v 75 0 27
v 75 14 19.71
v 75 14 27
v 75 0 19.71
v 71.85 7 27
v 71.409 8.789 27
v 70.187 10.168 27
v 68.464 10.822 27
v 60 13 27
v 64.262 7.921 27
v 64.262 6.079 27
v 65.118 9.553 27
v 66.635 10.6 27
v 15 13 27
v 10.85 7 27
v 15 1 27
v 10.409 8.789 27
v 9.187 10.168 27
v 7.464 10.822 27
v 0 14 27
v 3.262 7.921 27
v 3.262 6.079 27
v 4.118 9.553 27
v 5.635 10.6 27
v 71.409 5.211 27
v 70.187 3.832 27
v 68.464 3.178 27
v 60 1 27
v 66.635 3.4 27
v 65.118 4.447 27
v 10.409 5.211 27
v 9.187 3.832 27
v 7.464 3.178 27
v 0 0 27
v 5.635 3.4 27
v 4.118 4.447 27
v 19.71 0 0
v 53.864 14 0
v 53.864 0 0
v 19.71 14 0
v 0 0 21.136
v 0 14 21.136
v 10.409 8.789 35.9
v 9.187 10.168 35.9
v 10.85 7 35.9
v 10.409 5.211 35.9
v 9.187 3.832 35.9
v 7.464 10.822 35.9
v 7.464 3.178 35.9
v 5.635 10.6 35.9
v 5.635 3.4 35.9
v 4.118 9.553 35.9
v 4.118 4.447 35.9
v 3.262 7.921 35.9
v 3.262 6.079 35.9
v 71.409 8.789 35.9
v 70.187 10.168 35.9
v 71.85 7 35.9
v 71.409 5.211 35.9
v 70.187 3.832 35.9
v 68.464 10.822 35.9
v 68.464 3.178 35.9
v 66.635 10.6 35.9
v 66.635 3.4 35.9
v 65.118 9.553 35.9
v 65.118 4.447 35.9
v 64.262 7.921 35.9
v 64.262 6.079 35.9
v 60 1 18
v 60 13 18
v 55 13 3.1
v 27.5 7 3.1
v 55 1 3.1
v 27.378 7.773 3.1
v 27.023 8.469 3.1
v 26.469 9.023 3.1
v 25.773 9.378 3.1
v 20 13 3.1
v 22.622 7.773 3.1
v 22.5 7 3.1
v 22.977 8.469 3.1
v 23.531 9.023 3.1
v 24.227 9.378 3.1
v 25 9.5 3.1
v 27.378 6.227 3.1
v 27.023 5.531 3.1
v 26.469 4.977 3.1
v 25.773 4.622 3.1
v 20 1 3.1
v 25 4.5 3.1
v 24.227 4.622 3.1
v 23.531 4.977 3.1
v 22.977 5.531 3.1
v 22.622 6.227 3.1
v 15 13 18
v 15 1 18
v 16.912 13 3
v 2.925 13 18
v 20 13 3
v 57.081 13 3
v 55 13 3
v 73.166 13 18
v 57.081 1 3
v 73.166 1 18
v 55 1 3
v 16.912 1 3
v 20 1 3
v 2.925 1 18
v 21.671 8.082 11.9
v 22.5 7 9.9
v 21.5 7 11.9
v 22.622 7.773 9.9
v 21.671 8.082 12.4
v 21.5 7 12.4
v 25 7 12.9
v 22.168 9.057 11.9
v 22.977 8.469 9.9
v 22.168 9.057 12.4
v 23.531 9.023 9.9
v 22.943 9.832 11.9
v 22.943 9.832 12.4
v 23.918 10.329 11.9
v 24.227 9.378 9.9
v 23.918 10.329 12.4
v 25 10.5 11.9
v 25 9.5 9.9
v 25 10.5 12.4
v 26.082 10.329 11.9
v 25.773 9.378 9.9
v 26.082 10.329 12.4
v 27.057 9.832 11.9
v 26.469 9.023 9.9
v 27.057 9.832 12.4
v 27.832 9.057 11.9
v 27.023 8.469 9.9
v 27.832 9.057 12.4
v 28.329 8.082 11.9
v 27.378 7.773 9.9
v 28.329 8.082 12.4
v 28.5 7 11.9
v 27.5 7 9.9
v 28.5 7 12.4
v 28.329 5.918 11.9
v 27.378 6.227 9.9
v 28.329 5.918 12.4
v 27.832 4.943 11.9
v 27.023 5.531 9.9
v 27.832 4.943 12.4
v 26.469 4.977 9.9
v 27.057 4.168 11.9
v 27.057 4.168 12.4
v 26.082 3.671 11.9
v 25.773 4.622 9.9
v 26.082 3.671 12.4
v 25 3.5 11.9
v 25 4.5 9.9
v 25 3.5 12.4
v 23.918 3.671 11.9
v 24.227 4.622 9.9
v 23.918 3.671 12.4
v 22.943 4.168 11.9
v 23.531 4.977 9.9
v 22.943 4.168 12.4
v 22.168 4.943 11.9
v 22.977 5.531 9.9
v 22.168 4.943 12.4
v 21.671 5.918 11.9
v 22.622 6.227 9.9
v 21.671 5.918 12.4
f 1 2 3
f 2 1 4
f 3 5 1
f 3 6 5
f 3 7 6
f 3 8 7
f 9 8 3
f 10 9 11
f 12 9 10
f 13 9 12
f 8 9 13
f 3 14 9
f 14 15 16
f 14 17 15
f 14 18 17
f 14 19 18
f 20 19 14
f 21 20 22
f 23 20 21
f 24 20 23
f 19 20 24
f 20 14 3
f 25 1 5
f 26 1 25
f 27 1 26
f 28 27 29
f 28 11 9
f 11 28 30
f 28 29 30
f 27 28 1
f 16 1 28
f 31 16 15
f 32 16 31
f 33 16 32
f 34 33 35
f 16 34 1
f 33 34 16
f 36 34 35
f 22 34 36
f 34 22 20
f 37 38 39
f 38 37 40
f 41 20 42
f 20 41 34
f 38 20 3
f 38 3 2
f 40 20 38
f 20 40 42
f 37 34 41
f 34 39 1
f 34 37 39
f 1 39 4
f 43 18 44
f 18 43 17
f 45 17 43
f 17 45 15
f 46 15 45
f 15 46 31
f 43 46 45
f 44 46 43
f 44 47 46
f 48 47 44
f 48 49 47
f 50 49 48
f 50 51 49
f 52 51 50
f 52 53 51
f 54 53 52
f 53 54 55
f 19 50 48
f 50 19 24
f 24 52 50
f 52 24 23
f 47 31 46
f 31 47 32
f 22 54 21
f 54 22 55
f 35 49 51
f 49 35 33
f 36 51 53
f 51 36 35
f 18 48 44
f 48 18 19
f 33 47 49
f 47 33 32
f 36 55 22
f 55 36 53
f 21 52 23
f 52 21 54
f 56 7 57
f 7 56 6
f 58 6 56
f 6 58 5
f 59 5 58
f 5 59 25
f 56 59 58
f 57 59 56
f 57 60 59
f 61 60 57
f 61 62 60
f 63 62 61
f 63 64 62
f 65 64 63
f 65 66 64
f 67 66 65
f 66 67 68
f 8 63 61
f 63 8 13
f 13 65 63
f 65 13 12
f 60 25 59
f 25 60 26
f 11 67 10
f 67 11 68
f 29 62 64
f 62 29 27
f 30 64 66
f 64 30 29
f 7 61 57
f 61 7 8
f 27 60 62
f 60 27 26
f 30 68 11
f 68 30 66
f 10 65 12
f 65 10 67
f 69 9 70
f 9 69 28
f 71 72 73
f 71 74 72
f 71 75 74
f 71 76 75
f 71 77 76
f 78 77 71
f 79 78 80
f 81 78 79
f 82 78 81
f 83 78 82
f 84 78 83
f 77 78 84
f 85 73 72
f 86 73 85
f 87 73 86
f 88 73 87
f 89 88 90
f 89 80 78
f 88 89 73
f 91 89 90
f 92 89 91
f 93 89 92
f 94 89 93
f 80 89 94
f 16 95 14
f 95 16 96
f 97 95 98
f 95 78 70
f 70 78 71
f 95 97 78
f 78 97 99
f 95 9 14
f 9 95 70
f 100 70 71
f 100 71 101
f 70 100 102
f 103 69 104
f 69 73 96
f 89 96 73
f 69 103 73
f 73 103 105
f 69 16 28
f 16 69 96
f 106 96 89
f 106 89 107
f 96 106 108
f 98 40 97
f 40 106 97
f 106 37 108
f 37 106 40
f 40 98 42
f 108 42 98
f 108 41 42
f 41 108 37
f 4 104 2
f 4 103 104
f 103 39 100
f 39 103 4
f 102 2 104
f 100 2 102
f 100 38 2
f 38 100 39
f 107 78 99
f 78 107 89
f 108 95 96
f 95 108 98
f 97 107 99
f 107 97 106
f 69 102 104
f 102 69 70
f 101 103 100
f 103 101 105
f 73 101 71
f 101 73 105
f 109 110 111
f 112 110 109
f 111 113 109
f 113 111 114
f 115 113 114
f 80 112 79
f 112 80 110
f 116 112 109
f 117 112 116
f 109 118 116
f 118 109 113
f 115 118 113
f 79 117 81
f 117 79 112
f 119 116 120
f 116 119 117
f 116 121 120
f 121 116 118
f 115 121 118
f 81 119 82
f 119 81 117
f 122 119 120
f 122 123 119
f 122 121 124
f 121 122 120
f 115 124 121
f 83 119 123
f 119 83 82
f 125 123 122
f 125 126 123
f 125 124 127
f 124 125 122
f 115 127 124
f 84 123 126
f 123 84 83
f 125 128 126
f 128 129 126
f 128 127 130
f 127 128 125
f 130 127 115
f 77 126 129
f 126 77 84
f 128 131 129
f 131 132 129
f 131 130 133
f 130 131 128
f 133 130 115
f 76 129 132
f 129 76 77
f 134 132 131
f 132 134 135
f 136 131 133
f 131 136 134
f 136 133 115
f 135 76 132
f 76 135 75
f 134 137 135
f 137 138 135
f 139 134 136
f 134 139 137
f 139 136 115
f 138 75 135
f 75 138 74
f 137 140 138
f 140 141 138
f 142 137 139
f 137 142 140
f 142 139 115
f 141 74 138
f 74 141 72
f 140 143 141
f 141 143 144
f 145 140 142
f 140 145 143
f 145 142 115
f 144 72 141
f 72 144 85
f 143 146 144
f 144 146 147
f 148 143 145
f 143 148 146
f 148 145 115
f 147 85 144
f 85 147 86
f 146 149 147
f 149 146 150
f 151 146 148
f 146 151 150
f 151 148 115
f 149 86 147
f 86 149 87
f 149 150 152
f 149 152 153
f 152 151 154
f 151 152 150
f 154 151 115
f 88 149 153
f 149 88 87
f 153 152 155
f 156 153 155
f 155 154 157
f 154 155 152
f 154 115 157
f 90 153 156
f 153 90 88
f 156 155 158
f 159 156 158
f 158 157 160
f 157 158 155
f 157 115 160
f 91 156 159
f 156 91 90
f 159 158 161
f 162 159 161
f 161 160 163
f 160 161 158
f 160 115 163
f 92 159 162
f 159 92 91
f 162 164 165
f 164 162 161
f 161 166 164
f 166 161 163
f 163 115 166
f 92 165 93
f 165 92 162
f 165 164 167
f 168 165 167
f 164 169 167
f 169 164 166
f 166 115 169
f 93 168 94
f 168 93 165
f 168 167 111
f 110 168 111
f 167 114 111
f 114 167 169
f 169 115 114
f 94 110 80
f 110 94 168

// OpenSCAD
/**
GOL Clock - A clock that displays simulations.
Copyright (C) 2021 Kevin Ruffin

This file is part of GOL Clock.

GOL Clock is free software: you can redistribute it and/or modify
it under the terms of the GNU General Public License as published by
the Free Software Foundation, either version 3 of the License, or
(at your option) any later version.

GOL Clock is distributed in the hope that it will be useful,
but WITHOUT ANY WARRANTY; without even the implied warranty of
MERCHANTABILITY or FITNESS FOR A PARTICULAR PURPOSE.  See the
GNU General Public License for more details.

You should have received a copy of the GNU General Public License
along with this program.  If not, see <https://www.gnu.org/licenses/>.
*/

edge_xwidth = 3;
edge_zwidth = 3;

xlen = 130 + 2*edge_xwidth;
zlen = 140 + edge_zwidth;
ylen = 35;

cutout_zlen = 20;
cutout_xlen = 65 + edge_xwidth;
cutout_ylen = ylen+1;



inner_cutout_zlen = zlen ;
inner_cutout_xlen = xlen - 2*edge_xwidth;
inner_cutout_ylen = 16;//ylen - 5;

screen_overhang_ylen = 2;

inner_rail_ylen = ylen - inner_cutout_ylen - screen_overhang_ylen - 3;//5;
inner_rail_xlen = 15;
inner_rail_short_xlen = inner_rail_xlen - 7;
inner_rail_short_zlen = 15;

screw_hole_ylen = inner_rail_ylen+5;

board_hole_xlen = 45;
board_hole_ylen = 8;
board_hole_zlen = edge_zwidth + 1;

board_hole_mount_radius = 4;

case_cover_xlen = board_hole_xlen + 6*board_hole_mount_radius + 2*edge_xwidth;
case_cover_ylen = board_hole_ylen + 2*edge_xwidth;
case_cover_inner_ylen = board_hole_ylen + 4;
case_cover_zlen = 24 + edge_zwidth;


//translate([xlen/2, ylen/2, (zlen+edge_zwidth)/2 + zlen - cutout_zlen+0.1]) rotate([0,180,0]) translate([-xlen/2, -ylen/2, -(zlen-edge_zwidth)/2]) case_base();
//case_base();

//case_left();
//translate([xlen/2 - case_cover_xlen/2,screen_overhang_ylen + inner_cutout_ylen - edge_xwidth,-case_cover_zlen]) case_left_cover();

case_left_cover();
//translate([xlen,0,0]) color([1,1,0]) cube([5, 1, 133]);
//translate([xlen,0,133]) color([1,0,1]) cube([5, 1, 133]);

//translate([case_cover_xlen/3,case_cover_ylen/2,edge_zwidth]) cylinder(h=7, r=2.5);



module case_left_cover() {
    union() {
        translate([case_cover_xlen/3,case_cover_ylen/2,edge_zwidth-0.1]) rotate_extrude($fn=20) polygon( points=[[0,0],[2.5,0],[2.5,7],[3.5,9],[3.5,9.5],[0,10]] );
        
    difference() {
        union() {
            cube([case_cover_xlen, case_cover_ylen, case_cover_zlen]);
            translate([edge_xwidth + board_hole_mount_radius, edge_xwidth + board_hole_mount_radius, case_cover_zlen-0.1]) cylinder(h=board_hole_zlen+5, r=board_hole_mount_radius-0.15);
    
            translate([case_cover_xlen - edge_xwidth - board_hole_mount_radius, edge_xwidth + board_hole_mount_radius, case_cover_zlen-0.1]) cylinder(h=board_hole_zlen+5, r=board_hole_mount_radius-0.15);
        };
      
      //translate([edge_xwidth, edge_xwidth, edge_zwidth+0.1]) cube([case_cover_xlen - 2* edge_xwidth, case_cover_ylen - 2 * edge_xwidth, case_cover_zlen - edge_zwidth]);
        
        translate([edge_xwidth + 3 * board_hole_mount_radius,(case_cover_ylen - case_cover_inner_ylen)/2,edge_zwidth + 0.1]) cube([board_hole_xlen, case_cover_inner_ylen, case_cover_zlen - edge_zwidth]);
        
        angle_xlen = 30;
        angle_zlen = 30;
        translate([-0.8,0,0]) rotate([0, 47, 0]) translate([-angle_xlen/2,-0.5,-angle_zlen/2]) cube([angle_xlen,case_cover_ylen+1,angle_zlen]);
        
        translate([case_cover_xlen,0,-0.8]) rotate([0, 47, 0]) translate([-angle_xlen/2,-0.5,-angle_zlen/2]) cube([angle_xlen,case_cover_ylen+1,angle_zlen]);
        
        tri_x = 8.45;//5.65;
        tri_z = 8.45;//5.65;
        //translate([tri_x*1.5,edge_xwidth+4,edge_zwidth+3.2]) rotate([0,45,90]) translate([-tri_x/2,0,-tri_z/2]) polyhedron ( points = [[0, -5, tri_z], [0, 5, tri_z], [0, 5, 0], [0, -5, 0], [tri_x, -5, tri_z], [tri_x, 5, tri_z]], triangles = [[0,3,2], [0,2,1], [3,0,4], [1,2,5], [0,5,4], [0,1,5],  [5,2,4], [4,2,3], ]);
        
        translate([0,(case_cover_ylen - case_cover_inner_ylen)/2,edge_zwidth]) cube([20,case_cover_inner_ylen,15]);
        
        //translate([case_cover_xlen - tri_x*1.5,edge_xwidth+4,edge_zwidth+3.2]) rotate([0,45,90]) translate([-tri_x/2,0,-tri_z/2]) polyhedron ( points = [[0, -5, tri_z], [0, 5, tri_z], [0, 5, 0], [0, -5, 0], [tri_x, -5, tri_z], [tri_x, 5, tri_z]], triangles = [[0,3,2], [0,2,1], [3,0,4], [1,2,5], [0,5,4], [0,1,5],  [5,2,4], [4,2,3], ]);
        translate([case_cover_xlen - 20,(case_cover_ylen - case_cover_inner_ylen)/2,edge_zwidth]) cube([20,case_cover_inner_ylen,15]);
        
    };

    
};
};

module case_left() {
    
    
    difference() {
        case_base();
        
        translate([xlen/2 - board_hole_xlen/2,screen_overhang_ylen + inner_cutout_ylen,-0.5]) cube([board_hole_xlen, board_hole_ylen, board_hole_zlen]);
        
        translate([xlen/2 - board_hole_xlen/2 - 2*board_hole_mount_radius, screen_overhang_ylen + inner_cutout_ylen + board_hole_mount_radius, -0.5]) cylinder(h=board_hole_zlen, r=board_hole_mount_radius);
    
        translate([xlen/2 + board_hole_xlen/2 + 2*board_hole_mount_radius, screen_overhang_ylen + inner_cutout_ylen + board_hole_mount_radius, -0.5]) cylinder(h=board_hole_zlen, r=board_hole_mount_radius);
    };
    
    
};

module case_base() {
    difference() {
        cube([xlen, ylen, zlen]);
        
        translate([-0.5,-0.5,zlen-cutout_zlen-0.1]) color([1,0,0]) cube([cutout_xlen + 0.6,cutout_ylen,cutout_zlen + 0.5]);
        
        translate([edge_xwidth, screen_overhang_ylen, edge_zwidth]) color([0, 1, 0]) cube([inner_cutout_xlen, inner_cutout_ylen, inner_cutout_zlen]);
        
        //translate([edge_xwidth, screen_overhang_ylen + inner_cutout_ylen + inner_rail_ylen, edge_zwidth]) color([0, 1, 0]) cube([inner_cutout_xlen, ylen - inner_cutout_ylen - inner_rail_ylen - 5, inner_cutout_zlen]);
        
        translate([edge_xwidth + inner_rail_short_xlen, screen_overhang_ylen + inner_cutout_ylen - 0.5, edge_zwidth+inner_rail_short_zlen]) color([0, 1, 0]) cube([inner_cutout_xlen - inner_rail_xlen - inner_rail_short_xlen, inner_rail_ylen + 0.5, inner_cutout_zlen]);
        
        translate([edge_xwidth + inner_rail_xlen, screen_overhang_ylen + inner_cutout_ylen - 0.5, edge_zwidth]) color([0, 1, 0]) cube([inner_cutout_xlen - 2*inner_rail_xlen, inner_rail_ylen + 0.5, inner_rail_short_zlen+0.5]);
        
        translate([edge_xwidth+2, screen_overhang_ylen-4, edge_zwidth+2]) color([0, 0, 1]) cube([inner_cutout_xlen - 4, inner_cutout_ylen, inner_cutout_zlen]);
        
        translate([xlen - edge_xwidth - 10,inner_cutout_ylen + screen_overhang_ylen+screw_hole_ylen/2,edge_zwidth+ 10 + 120]) screw_hole();

        translate([xlen - edge_xwidth - 10,inner_cutout_ylen + screen_overhang_ylen+screw_hole_ylen/2,edge_zwidth+ 10]) screw_hole();

        translate([edge_xwidth + 8,inner_cutout_ylen + screen_overhang_ylen+screw_hole_ylen/2,edge_zwidth+ 10]) screw_hole();
        
        translate([xlen/4,ylen,zlen/7]) mount_hole();
        translate([xlen*3/4,ylen,zlen/7]) mount_hole();
    };
};

module screw_hole() {
    //translate([xlen - edge_xwidth - 6,inner_cutout_ylen + screen_overhang_ylen+screw_hole_ylen/2-1,zlen - 10]) rotate([90,0,0]) translate([0,0,-screw_hole_ylen/2]) color([0,0,1]) cylinder(h=screw_hole_ylen, r=1.5);

    //translate([xlen - edge_xwidth - 6,inner_cutout_ylen + screen_overhang_ylen+screw_hole_ylen/2+3,zlen - 10]) rotate([90,0,0]) translate([0,0,-screw_hole_ylen/2]) color([0,0,1]) cylinder(h=screw_hole_ylen, r=2.5);
    
    
    translate([0,-1,0]) rotate([90,90,0]) translate([0,0,-screw_hole_ylen/2]) color([0,0,1]) cylinder(h=screw_hole_ylen, r=2.0);

    translate([0,3,0]) rotate([90,90,0]) translate([0,0,-screw_hole_ylen/2]) color([0,0,1]) cylinder(h=screw_hole_ylen, r=3);
};

module mount_hole() {
    tri_x = 7;
    tri_z = 7;
    union() {
        translate([-0.1,0,0]) rotate([0,135,0]) translate([-tri_x/2,0,-tri_z/2]) polyhedron ( points = [[0, -5, tri_z], [0, 5, tri_z], [0, 5, 0], [0, -5, 0], [tri_x, -5, tri_z], [tri_x, 5, tri_z]], 
    triangles = [[0,3,2], [0,2,1], [3,0,4], [1,2,5], [0,5,4], [0,1,5],  [5,2,4], [4,2,3], ]);
        rotate([0,-45,0]) translate([-tri_x/2,0,-tri_z/2]) polyhedron ( points = [[0, -5, tri_z], [0, 5, tri_z], [0, 5, 0], [0, -5, 0], [tri_x, -5, tri_z], [tri_x, 5, tri_z]], 
    triangles = [[0,3,2], [0,2,1], [3,0,4], [1,2,5], [0,5,4], [0,1,5],  [5,2,4], [4,2,3], ]);
    };
};
